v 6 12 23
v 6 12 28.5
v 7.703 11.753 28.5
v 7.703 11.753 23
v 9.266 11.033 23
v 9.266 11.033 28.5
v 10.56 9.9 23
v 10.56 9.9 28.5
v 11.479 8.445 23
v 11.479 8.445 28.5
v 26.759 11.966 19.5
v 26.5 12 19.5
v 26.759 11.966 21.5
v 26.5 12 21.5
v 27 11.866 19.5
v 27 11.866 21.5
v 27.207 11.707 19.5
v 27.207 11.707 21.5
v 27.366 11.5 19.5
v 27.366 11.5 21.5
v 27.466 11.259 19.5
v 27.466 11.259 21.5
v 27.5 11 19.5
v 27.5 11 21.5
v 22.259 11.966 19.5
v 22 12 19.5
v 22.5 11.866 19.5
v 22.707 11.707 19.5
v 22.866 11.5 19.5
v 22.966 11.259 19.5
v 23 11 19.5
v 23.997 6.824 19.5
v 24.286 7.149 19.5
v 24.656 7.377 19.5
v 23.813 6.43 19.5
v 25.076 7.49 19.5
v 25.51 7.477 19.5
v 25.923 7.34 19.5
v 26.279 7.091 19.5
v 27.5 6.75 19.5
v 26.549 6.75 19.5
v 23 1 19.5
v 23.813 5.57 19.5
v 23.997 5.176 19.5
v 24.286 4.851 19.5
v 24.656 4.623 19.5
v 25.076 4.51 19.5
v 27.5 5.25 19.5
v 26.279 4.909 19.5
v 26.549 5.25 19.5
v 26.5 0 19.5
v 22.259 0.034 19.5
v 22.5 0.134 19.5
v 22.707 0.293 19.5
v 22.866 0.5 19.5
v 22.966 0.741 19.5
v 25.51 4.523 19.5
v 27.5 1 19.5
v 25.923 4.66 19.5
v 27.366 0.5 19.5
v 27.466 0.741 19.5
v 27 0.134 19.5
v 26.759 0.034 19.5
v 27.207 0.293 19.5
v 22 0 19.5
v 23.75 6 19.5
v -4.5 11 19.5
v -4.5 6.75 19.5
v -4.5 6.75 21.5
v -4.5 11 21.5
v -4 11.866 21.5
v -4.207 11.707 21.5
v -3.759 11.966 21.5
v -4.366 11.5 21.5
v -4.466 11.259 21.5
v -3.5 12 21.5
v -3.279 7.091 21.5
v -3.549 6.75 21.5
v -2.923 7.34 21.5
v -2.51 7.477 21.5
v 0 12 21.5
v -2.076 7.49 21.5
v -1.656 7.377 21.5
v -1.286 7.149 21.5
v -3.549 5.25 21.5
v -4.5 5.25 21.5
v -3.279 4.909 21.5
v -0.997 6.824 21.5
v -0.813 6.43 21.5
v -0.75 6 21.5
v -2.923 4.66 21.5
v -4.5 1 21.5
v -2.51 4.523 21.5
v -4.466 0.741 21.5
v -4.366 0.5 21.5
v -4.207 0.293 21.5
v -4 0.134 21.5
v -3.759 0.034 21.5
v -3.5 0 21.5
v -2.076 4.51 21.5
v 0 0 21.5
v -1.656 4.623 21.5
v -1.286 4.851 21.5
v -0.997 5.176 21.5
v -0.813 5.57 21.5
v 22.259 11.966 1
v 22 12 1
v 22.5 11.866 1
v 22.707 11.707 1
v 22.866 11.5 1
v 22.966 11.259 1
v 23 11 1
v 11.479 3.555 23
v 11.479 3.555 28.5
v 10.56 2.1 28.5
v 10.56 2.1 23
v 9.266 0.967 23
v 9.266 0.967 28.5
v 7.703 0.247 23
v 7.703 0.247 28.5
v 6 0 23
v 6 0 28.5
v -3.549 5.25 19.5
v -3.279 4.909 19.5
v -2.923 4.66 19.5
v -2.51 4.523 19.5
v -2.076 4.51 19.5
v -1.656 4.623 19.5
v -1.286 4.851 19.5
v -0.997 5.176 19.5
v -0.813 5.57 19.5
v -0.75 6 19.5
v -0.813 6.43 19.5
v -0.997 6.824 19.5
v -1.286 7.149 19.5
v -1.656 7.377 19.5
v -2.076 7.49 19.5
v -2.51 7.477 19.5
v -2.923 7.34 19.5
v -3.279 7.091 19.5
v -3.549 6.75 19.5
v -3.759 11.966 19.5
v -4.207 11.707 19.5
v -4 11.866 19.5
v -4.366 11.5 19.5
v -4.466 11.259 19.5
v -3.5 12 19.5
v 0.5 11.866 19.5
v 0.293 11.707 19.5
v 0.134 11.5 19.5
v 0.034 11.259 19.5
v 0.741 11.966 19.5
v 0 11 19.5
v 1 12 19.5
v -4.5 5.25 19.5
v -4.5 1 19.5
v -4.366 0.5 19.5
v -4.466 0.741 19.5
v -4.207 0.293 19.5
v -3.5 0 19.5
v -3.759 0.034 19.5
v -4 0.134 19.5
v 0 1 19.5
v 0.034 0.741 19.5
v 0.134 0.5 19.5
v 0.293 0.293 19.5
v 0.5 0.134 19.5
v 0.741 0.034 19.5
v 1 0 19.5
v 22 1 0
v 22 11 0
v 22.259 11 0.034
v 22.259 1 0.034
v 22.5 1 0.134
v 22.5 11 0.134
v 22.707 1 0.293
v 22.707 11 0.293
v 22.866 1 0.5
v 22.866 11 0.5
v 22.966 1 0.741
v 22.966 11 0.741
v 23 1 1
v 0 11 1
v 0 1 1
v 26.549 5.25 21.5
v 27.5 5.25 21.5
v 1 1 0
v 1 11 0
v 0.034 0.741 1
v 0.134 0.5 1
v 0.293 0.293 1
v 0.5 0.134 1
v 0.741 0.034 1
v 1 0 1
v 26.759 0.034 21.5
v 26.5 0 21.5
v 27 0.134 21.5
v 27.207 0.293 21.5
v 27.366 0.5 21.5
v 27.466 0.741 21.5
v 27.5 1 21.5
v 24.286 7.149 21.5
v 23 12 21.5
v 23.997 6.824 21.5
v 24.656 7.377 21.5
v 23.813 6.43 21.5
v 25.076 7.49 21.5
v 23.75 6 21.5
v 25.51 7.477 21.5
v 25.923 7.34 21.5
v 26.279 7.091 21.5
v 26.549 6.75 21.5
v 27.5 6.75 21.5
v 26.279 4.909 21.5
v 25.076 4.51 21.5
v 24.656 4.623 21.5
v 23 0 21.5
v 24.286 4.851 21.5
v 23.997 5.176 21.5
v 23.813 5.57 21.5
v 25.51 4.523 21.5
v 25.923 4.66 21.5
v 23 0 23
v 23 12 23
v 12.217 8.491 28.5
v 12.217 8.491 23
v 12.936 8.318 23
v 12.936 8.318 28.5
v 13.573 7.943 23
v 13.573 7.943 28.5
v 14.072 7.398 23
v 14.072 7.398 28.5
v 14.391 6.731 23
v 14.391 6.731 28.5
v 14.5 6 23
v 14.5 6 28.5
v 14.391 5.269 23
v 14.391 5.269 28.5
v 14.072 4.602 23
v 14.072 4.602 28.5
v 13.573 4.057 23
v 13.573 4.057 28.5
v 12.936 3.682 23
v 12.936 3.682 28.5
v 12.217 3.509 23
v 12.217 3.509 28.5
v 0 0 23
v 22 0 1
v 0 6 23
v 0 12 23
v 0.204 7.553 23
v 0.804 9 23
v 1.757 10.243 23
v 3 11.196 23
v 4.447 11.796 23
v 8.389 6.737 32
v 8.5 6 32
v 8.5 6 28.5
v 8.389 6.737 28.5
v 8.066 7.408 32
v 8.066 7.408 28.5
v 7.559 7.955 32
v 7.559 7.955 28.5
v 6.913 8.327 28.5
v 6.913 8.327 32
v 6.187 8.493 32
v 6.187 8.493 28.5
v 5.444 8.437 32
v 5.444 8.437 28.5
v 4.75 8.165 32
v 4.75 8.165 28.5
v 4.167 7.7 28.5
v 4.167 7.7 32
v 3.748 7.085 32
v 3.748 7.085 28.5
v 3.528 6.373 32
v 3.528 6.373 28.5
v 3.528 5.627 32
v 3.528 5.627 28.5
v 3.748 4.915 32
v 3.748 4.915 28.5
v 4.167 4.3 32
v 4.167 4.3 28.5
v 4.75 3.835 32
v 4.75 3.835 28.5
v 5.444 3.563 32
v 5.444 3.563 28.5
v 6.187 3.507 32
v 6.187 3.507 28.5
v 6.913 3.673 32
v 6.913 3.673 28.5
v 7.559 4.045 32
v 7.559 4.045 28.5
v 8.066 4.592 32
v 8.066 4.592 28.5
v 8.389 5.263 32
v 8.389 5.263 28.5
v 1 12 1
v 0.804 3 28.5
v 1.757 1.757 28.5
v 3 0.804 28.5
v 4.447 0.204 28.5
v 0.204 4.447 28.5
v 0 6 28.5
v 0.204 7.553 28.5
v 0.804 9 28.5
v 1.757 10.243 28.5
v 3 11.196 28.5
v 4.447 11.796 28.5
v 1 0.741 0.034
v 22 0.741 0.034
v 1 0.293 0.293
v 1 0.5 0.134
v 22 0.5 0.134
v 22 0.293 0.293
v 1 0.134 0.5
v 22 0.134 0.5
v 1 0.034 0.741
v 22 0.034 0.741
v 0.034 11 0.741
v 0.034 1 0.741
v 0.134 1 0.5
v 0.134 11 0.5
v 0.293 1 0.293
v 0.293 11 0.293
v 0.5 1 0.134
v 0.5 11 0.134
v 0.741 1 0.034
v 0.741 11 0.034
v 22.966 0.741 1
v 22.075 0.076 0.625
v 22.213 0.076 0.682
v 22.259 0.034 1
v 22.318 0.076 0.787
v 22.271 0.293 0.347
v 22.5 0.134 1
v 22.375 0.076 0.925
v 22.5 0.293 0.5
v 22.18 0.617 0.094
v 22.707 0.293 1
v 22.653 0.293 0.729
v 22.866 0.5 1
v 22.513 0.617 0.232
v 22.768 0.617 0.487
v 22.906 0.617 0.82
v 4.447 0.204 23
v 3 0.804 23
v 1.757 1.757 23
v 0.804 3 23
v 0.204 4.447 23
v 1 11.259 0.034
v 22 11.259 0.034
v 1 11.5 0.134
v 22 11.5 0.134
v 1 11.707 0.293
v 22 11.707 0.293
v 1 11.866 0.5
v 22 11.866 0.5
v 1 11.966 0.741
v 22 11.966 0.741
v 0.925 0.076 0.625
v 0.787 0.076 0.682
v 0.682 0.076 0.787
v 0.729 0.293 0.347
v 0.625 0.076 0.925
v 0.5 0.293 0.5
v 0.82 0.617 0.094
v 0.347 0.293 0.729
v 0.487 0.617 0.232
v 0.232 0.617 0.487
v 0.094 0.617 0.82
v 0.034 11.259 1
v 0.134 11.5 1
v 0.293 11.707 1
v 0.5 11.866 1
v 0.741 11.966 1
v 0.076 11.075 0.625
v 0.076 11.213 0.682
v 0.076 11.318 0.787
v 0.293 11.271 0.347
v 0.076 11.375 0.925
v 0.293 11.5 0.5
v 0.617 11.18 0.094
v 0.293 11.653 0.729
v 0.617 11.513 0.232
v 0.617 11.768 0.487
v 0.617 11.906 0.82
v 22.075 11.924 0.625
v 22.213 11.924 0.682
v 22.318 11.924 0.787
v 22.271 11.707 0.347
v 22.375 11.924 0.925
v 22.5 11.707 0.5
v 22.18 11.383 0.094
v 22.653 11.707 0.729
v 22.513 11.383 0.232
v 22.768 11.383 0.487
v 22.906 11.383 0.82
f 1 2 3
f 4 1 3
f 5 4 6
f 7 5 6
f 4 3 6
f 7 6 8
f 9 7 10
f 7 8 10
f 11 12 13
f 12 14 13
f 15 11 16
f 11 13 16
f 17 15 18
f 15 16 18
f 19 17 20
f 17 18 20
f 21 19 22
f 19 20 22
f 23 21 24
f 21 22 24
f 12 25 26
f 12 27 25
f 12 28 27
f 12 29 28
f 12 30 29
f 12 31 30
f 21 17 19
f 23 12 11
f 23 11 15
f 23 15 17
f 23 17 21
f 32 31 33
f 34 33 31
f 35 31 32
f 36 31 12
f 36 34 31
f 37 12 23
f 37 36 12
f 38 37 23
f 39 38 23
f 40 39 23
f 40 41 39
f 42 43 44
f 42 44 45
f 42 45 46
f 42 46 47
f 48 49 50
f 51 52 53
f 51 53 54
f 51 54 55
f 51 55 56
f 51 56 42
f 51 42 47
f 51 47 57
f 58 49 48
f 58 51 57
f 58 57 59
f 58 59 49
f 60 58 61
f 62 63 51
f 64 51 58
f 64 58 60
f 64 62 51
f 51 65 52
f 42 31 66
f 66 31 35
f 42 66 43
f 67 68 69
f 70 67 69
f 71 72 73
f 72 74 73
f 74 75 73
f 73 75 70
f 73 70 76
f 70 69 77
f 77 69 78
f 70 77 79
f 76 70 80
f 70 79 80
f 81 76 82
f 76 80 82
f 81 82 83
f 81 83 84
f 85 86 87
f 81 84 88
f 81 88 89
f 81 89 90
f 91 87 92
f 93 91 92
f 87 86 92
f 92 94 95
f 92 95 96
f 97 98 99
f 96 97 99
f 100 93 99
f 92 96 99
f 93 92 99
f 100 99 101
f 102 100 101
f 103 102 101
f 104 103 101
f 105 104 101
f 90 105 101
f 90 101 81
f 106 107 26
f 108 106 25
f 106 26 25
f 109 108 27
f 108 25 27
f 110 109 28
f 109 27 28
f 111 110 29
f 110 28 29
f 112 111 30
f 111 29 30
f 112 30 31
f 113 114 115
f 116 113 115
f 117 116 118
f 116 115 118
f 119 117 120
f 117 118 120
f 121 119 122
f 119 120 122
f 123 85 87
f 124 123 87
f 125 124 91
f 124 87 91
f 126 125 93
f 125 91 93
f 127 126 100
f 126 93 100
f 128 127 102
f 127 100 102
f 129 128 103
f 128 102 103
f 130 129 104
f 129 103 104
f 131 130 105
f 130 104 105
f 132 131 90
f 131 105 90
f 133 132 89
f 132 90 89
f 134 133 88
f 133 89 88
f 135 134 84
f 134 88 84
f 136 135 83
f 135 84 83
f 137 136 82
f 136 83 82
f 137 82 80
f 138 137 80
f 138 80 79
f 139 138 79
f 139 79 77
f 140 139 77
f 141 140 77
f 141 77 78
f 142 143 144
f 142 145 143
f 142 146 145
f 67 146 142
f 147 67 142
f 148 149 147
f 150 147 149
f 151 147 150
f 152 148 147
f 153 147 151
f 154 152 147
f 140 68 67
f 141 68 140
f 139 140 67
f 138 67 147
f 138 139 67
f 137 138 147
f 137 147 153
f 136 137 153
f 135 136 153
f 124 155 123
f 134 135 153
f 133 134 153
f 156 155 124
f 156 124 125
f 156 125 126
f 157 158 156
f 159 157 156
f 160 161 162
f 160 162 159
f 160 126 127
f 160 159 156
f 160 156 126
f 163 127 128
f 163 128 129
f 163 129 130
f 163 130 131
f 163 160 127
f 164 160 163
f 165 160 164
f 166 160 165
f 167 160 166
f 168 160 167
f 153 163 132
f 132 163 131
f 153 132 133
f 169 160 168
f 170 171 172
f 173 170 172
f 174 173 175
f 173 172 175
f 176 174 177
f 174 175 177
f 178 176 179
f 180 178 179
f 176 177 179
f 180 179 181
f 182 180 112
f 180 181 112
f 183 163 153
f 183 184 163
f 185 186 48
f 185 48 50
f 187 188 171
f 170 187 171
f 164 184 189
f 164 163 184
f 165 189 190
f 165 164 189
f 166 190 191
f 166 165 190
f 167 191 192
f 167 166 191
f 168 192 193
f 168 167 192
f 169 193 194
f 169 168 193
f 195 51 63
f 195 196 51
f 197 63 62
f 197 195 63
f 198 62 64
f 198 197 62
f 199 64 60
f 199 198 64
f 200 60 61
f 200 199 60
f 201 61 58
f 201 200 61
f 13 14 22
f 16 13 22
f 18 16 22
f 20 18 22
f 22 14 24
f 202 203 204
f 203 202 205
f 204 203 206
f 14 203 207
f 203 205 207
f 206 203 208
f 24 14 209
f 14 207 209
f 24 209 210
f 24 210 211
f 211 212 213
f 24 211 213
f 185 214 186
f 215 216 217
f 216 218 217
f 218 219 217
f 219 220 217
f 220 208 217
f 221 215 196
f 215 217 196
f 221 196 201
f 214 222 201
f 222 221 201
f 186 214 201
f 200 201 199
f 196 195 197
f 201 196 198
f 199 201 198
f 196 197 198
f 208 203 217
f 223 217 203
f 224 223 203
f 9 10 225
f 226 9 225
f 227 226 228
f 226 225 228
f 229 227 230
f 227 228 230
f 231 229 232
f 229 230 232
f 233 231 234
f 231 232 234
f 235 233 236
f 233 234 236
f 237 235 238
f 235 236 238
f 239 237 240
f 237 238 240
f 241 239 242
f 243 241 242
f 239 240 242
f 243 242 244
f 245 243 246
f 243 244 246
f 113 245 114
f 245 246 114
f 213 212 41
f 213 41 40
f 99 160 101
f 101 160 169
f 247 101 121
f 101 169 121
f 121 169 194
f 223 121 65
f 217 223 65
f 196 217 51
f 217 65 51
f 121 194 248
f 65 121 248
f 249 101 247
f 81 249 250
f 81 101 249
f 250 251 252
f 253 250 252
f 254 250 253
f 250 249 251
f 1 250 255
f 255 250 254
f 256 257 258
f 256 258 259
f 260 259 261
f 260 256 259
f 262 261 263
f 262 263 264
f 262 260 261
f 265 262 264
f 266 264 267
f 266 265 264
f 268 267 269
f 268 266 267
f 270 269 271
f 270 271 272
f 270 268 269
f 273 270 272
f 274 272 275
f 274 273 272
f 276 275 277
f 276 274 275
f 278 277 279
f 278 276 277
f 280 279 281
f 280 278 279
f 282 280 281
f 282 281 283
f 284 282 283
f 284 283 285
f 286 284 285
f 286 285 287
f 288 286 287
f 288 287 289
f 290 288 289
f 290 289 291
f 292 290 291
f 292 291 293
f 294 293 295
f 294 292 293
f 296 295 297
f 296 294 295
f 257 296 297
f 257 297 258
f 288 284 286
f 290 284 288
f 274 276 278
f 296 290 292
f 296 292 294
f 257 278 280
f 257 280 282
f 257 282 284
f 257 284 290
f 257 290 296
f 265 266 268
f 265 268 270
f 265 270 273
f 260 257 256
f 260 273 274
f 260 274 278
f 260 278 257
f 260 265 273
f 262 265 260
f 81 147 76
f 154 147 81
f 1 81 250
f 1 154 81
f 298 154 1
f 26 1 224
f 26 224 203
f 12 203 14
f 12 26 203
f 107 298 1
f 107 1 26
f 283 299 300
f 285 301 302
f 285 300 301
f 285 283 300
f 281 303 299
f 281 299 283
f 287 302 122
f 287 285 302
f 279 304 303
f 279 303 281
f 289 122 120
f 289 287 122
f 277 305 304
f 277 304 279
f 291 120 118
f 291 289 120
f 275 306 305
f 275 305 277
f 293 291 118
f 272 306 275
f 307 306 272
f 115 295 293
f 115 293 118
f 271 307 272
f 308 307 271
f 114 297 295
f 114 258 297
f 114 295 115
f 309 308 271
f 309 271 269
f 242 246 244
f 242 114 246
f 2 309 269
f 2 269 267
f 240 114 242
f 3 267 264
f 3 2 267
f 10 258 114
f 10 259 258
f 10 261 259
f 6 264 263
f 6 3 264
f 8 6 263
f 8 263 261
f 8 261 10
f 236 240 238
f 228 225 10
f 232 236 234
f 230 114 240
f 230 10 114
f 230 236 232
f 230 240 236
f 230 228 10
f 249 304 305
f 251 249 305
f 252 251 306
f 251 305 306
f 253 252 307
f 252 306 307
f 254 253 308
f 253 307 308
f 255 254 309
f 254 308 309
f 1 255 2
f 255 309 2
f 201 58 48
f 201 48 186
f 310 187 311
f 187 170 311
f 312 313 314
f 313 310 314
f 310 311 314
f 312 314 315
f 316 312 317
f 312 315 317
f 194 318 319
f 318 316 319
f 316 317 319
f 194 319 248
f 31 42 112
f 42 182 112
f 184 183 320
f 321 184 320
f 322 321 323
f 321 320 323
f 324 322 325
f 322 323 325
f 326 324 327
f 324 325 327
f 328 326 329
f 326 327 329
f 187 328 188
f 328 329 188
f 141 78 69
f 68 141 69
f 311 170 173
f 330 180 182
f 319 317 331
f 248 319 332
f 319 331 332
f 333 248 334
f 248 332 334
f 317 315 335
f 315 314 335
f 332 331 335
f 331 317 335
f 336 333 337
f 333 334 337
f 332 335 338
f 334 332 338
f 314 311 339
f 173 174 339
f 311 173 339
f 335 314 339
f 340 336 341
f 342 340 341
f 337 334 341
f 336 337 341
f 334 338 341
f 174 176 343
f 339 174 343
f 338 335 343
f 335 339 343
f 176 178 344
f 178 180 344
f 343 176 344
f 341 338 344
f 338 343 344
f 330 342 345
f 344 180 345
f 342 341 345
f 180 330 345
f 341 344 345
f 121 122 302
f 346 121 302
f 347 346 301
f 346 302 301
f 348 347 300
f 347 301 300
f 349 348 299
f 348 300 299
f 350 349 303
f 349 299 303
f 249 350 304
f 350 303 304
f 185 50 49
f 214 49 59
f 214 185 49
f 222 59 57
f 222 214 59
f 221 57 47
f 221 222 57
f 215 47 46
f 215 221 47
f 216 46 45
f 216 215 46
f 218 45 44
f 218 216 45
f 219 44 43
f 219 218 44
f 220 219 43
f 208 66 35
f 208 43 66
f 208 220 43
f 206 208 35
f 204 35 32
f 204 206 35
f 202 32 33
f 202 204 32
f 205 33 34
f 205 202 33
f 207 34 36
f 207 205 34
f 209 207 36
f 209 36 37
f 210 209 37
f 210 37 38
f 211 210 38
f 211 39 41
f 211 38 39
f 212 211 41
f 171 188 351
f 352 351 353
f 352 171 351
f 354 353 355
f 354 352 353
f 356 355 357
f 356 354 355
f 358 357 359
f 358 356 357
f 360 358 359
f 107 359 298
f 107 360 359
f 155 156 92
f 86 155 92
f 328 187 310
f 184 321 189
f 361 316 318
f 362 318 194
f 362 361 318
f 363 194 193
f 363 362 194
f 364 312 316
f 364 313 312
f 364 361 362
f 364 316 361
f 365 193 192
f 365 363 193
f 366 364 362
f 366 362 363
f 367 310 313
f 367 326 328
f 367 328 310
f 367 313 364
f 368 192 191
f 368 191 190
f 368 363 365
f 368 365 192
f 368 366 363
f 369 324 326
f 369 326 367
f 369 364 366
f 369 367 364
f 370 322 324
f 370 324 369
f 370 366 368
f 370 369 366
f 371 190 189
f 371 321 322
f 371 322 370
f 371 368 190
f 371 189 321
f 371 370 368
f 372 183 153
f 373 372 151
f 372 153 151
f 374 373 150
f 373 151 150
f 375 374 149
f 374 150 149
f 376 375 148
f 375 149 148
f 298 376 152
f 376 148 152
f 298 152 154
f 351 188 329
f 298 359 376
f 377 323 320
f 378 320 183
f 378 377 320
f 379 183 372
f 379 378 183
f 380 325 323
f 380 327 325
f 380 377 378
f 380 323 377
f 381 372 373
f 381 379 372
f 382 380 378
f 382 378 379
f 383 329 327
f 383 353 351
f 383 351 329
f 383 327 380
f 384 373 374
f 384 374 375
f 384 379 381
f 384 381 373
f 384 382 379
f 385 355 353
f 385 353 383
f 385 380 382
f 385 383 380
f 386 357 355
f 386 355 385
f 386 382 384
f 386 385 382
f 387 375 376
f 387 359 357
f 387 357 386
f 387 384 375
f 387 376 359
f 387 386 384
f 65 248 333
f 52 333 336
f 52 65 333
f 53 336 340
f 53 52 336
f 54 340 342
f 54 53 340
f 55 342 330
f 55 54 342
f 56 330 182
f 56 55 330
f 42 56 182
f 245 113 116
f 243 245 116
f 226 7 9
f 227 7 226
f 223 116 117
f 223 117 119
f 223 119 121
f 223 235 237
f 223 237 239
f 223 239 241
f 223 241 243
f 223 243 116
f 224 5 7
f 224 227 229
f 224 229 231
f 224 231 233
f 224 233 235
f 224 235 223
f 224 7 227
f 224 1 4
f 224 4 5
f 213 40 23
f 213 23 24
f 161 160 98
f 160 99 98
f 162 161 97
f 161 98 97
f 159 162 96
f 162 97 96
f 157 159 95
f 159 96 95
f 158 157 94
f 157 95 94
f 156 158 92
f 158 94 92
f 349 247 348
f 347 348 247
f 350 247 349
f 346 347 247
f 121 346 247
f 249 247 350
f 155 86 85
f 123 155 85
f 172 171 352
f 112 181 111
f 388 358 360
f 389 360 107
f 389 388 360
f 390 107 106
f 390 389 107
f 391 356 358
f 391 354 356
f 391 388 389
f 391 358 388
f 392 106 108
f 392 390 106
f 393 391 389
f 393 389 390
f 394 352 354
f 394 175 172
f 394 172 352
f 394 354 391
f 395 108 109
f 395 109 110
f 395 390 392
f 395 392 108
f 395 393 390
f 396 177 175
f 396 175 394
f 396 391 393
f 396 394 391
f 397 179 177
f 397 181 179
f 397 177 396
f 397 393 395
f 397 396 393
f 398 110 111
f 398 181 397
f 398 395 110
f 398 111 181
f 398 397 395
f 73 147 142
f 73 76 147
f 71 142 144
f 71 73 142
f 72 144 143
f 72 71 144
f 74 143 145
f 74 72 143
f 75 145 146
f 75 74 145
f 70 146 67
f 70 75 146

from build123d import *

# Parameters (mm, degrees)
SKETCH1_W           = 23
SKETCH1_H           = 12
BOSS_EXTRUDE1_DEPTH = 32
SKETCH2_W           = 4.5
SKETCH2_H           = 2
BOSS_EXTRUDE2_DEPTH = 12
CUT_EXTRUDE1_DEPTH  = 37.912057651
SKETCH4_W           = 23
SKETCH4_H           = 12
SKETCH4_R           = 2.5
CUT_EXTRUDE2_DEPTH  = 3.5
CUT_EXTRUDE3_DEPTH  = 5.5
FILLET1_R           = 1


with BuildPart() as part:
    # Sketch1 → Boss-Extrude1 (new body)
    with BuildSketch(Plane.XY):
        with Locations((11.5, 6)):
            Rectangle(SKETCH1_W, SKETCH1_H)
    extrude(amount=BOSS_EXTRUDE1_DEPTH)

    # Sketch2 → Boss-Extrude2 (add)
    with BuildSketch(Plane.XZ):
        with Locations((-2.25, 20.5)):
            Rectangle(SKETCH2_W, SKETCH2_H)
        with Locations((25.25, 20.5)):
            Rectangle(SKETCH2_W, SKETCH2_H)
    extrude(amount=-BOSS_EXTRUDE2_DEPTH)

    # Sketch3 → Cut-Extrude1 (cut, through all)
    with BuildSketch(Plane.XY.offset(21.5)):
        with BuildLine():
            Line((-3.549038106, 6.75), (-4.5, 6.75))
            Line((-4.5, 6.75), (-4.5, 5.25))
            Line((-4.5, 5.25), (-3.549038106, 5.25))
            ThreePointArc((-3.549038106, 5.25), (-0.75, 6), (-3.549038106, 6.75))
        make_face()
        with BuildLine():
            Line((26.549038106, 6.75), (27.5, 6.75))
            Line((27.5, 6.75), (27.5, 5.25))
            Line((27.5, 5.25), (26.549038106, 5.25))
            ThreePointArc((26.549038106, 5.25), (23.75, 6), (26.549038106, 6.75))
        make_face()
    extrude(amount=-CUT_EXTRUDE1_DEPTH, mode=Mode.SUBTRACT)

    # Sketch4 → Cut-Extrude2 (cut)
    with BuildSketch(Plane.XY.offset(32)):
        with Locations((11.5, 6)):
            Rectangle(SKETCH4_W, SKETCH4_H)
        with Locations((6, 6)):
            Circle(SKETCH4_R, mode=Mode.SUBTRACT)
    extrude(amount=-CUT_EXTRUDE2_DEPTH, mode=Mode.SUBTRACT)

    # Sketch5 → Cut-Extrude3 (cut)
    with BuildSketch(Plane.XY.offset(28.5)):
        with BuildLine():
            ThreePointArc((11.479166667, 3.554855293), (9.2656647, 0.966568361), (6.000000021, 0))
            Line((6.000000021, 0), (23, 0))
            Line((23, 0), (23, 12))
            Line((23, 12), (6.000000023, 12))
            ThreePointArc((6.000000023, 12), (9.265664701, 11.033431639), (11.479166667, 8.445144707))
            ThreePointArc((11.479166667, 8.445144707), (14.5, 6), (11.479166667, 3.554855293))
        make_face()
        with BuildLine():
            Line((0, 12), (0, 6.000000008))
            ThreePointArc((0, 6.000000008), (1.757359324, 10.242640698), (6.000000023, 12))
            Line((6.000000023, 12), (0, 12))
        make_face()
        with BuildLine():
            Line((0, 6.000000008), (0, 0))
            Line((0, 0), (6.000000021, 0))
            ThreePointArc((6.000000021, 0), (1.757359317, 1.757359308), (0, 6.000000008))
        make_face()
    extrude(amount=-CUT_EXTRUDE3_DEPTH, mode=Mode.SUBTRACT)

    # Fillet1
    fillet1_edges = [part.edges().sort_by_distance(p)[0] for p in [
        (23, 6, 0),
        (11.5, 12, 0),
        (0, 6, 0),
        (11.5, 0, 0),
        (27.5, 0, 20.5),
        (27.5, 12, 20.5),
        (-4.5, 12, 20.5),
        (-4.5, 0, 20.5),
        (0, 0, 9.75),
        (23, 0, 9.75),
        (23, 12, 9.75),
        (0, 12, 9.75),
    ]]
    fillet(fillet1_edges, radius=FILLET1_R)


solid = part.part
